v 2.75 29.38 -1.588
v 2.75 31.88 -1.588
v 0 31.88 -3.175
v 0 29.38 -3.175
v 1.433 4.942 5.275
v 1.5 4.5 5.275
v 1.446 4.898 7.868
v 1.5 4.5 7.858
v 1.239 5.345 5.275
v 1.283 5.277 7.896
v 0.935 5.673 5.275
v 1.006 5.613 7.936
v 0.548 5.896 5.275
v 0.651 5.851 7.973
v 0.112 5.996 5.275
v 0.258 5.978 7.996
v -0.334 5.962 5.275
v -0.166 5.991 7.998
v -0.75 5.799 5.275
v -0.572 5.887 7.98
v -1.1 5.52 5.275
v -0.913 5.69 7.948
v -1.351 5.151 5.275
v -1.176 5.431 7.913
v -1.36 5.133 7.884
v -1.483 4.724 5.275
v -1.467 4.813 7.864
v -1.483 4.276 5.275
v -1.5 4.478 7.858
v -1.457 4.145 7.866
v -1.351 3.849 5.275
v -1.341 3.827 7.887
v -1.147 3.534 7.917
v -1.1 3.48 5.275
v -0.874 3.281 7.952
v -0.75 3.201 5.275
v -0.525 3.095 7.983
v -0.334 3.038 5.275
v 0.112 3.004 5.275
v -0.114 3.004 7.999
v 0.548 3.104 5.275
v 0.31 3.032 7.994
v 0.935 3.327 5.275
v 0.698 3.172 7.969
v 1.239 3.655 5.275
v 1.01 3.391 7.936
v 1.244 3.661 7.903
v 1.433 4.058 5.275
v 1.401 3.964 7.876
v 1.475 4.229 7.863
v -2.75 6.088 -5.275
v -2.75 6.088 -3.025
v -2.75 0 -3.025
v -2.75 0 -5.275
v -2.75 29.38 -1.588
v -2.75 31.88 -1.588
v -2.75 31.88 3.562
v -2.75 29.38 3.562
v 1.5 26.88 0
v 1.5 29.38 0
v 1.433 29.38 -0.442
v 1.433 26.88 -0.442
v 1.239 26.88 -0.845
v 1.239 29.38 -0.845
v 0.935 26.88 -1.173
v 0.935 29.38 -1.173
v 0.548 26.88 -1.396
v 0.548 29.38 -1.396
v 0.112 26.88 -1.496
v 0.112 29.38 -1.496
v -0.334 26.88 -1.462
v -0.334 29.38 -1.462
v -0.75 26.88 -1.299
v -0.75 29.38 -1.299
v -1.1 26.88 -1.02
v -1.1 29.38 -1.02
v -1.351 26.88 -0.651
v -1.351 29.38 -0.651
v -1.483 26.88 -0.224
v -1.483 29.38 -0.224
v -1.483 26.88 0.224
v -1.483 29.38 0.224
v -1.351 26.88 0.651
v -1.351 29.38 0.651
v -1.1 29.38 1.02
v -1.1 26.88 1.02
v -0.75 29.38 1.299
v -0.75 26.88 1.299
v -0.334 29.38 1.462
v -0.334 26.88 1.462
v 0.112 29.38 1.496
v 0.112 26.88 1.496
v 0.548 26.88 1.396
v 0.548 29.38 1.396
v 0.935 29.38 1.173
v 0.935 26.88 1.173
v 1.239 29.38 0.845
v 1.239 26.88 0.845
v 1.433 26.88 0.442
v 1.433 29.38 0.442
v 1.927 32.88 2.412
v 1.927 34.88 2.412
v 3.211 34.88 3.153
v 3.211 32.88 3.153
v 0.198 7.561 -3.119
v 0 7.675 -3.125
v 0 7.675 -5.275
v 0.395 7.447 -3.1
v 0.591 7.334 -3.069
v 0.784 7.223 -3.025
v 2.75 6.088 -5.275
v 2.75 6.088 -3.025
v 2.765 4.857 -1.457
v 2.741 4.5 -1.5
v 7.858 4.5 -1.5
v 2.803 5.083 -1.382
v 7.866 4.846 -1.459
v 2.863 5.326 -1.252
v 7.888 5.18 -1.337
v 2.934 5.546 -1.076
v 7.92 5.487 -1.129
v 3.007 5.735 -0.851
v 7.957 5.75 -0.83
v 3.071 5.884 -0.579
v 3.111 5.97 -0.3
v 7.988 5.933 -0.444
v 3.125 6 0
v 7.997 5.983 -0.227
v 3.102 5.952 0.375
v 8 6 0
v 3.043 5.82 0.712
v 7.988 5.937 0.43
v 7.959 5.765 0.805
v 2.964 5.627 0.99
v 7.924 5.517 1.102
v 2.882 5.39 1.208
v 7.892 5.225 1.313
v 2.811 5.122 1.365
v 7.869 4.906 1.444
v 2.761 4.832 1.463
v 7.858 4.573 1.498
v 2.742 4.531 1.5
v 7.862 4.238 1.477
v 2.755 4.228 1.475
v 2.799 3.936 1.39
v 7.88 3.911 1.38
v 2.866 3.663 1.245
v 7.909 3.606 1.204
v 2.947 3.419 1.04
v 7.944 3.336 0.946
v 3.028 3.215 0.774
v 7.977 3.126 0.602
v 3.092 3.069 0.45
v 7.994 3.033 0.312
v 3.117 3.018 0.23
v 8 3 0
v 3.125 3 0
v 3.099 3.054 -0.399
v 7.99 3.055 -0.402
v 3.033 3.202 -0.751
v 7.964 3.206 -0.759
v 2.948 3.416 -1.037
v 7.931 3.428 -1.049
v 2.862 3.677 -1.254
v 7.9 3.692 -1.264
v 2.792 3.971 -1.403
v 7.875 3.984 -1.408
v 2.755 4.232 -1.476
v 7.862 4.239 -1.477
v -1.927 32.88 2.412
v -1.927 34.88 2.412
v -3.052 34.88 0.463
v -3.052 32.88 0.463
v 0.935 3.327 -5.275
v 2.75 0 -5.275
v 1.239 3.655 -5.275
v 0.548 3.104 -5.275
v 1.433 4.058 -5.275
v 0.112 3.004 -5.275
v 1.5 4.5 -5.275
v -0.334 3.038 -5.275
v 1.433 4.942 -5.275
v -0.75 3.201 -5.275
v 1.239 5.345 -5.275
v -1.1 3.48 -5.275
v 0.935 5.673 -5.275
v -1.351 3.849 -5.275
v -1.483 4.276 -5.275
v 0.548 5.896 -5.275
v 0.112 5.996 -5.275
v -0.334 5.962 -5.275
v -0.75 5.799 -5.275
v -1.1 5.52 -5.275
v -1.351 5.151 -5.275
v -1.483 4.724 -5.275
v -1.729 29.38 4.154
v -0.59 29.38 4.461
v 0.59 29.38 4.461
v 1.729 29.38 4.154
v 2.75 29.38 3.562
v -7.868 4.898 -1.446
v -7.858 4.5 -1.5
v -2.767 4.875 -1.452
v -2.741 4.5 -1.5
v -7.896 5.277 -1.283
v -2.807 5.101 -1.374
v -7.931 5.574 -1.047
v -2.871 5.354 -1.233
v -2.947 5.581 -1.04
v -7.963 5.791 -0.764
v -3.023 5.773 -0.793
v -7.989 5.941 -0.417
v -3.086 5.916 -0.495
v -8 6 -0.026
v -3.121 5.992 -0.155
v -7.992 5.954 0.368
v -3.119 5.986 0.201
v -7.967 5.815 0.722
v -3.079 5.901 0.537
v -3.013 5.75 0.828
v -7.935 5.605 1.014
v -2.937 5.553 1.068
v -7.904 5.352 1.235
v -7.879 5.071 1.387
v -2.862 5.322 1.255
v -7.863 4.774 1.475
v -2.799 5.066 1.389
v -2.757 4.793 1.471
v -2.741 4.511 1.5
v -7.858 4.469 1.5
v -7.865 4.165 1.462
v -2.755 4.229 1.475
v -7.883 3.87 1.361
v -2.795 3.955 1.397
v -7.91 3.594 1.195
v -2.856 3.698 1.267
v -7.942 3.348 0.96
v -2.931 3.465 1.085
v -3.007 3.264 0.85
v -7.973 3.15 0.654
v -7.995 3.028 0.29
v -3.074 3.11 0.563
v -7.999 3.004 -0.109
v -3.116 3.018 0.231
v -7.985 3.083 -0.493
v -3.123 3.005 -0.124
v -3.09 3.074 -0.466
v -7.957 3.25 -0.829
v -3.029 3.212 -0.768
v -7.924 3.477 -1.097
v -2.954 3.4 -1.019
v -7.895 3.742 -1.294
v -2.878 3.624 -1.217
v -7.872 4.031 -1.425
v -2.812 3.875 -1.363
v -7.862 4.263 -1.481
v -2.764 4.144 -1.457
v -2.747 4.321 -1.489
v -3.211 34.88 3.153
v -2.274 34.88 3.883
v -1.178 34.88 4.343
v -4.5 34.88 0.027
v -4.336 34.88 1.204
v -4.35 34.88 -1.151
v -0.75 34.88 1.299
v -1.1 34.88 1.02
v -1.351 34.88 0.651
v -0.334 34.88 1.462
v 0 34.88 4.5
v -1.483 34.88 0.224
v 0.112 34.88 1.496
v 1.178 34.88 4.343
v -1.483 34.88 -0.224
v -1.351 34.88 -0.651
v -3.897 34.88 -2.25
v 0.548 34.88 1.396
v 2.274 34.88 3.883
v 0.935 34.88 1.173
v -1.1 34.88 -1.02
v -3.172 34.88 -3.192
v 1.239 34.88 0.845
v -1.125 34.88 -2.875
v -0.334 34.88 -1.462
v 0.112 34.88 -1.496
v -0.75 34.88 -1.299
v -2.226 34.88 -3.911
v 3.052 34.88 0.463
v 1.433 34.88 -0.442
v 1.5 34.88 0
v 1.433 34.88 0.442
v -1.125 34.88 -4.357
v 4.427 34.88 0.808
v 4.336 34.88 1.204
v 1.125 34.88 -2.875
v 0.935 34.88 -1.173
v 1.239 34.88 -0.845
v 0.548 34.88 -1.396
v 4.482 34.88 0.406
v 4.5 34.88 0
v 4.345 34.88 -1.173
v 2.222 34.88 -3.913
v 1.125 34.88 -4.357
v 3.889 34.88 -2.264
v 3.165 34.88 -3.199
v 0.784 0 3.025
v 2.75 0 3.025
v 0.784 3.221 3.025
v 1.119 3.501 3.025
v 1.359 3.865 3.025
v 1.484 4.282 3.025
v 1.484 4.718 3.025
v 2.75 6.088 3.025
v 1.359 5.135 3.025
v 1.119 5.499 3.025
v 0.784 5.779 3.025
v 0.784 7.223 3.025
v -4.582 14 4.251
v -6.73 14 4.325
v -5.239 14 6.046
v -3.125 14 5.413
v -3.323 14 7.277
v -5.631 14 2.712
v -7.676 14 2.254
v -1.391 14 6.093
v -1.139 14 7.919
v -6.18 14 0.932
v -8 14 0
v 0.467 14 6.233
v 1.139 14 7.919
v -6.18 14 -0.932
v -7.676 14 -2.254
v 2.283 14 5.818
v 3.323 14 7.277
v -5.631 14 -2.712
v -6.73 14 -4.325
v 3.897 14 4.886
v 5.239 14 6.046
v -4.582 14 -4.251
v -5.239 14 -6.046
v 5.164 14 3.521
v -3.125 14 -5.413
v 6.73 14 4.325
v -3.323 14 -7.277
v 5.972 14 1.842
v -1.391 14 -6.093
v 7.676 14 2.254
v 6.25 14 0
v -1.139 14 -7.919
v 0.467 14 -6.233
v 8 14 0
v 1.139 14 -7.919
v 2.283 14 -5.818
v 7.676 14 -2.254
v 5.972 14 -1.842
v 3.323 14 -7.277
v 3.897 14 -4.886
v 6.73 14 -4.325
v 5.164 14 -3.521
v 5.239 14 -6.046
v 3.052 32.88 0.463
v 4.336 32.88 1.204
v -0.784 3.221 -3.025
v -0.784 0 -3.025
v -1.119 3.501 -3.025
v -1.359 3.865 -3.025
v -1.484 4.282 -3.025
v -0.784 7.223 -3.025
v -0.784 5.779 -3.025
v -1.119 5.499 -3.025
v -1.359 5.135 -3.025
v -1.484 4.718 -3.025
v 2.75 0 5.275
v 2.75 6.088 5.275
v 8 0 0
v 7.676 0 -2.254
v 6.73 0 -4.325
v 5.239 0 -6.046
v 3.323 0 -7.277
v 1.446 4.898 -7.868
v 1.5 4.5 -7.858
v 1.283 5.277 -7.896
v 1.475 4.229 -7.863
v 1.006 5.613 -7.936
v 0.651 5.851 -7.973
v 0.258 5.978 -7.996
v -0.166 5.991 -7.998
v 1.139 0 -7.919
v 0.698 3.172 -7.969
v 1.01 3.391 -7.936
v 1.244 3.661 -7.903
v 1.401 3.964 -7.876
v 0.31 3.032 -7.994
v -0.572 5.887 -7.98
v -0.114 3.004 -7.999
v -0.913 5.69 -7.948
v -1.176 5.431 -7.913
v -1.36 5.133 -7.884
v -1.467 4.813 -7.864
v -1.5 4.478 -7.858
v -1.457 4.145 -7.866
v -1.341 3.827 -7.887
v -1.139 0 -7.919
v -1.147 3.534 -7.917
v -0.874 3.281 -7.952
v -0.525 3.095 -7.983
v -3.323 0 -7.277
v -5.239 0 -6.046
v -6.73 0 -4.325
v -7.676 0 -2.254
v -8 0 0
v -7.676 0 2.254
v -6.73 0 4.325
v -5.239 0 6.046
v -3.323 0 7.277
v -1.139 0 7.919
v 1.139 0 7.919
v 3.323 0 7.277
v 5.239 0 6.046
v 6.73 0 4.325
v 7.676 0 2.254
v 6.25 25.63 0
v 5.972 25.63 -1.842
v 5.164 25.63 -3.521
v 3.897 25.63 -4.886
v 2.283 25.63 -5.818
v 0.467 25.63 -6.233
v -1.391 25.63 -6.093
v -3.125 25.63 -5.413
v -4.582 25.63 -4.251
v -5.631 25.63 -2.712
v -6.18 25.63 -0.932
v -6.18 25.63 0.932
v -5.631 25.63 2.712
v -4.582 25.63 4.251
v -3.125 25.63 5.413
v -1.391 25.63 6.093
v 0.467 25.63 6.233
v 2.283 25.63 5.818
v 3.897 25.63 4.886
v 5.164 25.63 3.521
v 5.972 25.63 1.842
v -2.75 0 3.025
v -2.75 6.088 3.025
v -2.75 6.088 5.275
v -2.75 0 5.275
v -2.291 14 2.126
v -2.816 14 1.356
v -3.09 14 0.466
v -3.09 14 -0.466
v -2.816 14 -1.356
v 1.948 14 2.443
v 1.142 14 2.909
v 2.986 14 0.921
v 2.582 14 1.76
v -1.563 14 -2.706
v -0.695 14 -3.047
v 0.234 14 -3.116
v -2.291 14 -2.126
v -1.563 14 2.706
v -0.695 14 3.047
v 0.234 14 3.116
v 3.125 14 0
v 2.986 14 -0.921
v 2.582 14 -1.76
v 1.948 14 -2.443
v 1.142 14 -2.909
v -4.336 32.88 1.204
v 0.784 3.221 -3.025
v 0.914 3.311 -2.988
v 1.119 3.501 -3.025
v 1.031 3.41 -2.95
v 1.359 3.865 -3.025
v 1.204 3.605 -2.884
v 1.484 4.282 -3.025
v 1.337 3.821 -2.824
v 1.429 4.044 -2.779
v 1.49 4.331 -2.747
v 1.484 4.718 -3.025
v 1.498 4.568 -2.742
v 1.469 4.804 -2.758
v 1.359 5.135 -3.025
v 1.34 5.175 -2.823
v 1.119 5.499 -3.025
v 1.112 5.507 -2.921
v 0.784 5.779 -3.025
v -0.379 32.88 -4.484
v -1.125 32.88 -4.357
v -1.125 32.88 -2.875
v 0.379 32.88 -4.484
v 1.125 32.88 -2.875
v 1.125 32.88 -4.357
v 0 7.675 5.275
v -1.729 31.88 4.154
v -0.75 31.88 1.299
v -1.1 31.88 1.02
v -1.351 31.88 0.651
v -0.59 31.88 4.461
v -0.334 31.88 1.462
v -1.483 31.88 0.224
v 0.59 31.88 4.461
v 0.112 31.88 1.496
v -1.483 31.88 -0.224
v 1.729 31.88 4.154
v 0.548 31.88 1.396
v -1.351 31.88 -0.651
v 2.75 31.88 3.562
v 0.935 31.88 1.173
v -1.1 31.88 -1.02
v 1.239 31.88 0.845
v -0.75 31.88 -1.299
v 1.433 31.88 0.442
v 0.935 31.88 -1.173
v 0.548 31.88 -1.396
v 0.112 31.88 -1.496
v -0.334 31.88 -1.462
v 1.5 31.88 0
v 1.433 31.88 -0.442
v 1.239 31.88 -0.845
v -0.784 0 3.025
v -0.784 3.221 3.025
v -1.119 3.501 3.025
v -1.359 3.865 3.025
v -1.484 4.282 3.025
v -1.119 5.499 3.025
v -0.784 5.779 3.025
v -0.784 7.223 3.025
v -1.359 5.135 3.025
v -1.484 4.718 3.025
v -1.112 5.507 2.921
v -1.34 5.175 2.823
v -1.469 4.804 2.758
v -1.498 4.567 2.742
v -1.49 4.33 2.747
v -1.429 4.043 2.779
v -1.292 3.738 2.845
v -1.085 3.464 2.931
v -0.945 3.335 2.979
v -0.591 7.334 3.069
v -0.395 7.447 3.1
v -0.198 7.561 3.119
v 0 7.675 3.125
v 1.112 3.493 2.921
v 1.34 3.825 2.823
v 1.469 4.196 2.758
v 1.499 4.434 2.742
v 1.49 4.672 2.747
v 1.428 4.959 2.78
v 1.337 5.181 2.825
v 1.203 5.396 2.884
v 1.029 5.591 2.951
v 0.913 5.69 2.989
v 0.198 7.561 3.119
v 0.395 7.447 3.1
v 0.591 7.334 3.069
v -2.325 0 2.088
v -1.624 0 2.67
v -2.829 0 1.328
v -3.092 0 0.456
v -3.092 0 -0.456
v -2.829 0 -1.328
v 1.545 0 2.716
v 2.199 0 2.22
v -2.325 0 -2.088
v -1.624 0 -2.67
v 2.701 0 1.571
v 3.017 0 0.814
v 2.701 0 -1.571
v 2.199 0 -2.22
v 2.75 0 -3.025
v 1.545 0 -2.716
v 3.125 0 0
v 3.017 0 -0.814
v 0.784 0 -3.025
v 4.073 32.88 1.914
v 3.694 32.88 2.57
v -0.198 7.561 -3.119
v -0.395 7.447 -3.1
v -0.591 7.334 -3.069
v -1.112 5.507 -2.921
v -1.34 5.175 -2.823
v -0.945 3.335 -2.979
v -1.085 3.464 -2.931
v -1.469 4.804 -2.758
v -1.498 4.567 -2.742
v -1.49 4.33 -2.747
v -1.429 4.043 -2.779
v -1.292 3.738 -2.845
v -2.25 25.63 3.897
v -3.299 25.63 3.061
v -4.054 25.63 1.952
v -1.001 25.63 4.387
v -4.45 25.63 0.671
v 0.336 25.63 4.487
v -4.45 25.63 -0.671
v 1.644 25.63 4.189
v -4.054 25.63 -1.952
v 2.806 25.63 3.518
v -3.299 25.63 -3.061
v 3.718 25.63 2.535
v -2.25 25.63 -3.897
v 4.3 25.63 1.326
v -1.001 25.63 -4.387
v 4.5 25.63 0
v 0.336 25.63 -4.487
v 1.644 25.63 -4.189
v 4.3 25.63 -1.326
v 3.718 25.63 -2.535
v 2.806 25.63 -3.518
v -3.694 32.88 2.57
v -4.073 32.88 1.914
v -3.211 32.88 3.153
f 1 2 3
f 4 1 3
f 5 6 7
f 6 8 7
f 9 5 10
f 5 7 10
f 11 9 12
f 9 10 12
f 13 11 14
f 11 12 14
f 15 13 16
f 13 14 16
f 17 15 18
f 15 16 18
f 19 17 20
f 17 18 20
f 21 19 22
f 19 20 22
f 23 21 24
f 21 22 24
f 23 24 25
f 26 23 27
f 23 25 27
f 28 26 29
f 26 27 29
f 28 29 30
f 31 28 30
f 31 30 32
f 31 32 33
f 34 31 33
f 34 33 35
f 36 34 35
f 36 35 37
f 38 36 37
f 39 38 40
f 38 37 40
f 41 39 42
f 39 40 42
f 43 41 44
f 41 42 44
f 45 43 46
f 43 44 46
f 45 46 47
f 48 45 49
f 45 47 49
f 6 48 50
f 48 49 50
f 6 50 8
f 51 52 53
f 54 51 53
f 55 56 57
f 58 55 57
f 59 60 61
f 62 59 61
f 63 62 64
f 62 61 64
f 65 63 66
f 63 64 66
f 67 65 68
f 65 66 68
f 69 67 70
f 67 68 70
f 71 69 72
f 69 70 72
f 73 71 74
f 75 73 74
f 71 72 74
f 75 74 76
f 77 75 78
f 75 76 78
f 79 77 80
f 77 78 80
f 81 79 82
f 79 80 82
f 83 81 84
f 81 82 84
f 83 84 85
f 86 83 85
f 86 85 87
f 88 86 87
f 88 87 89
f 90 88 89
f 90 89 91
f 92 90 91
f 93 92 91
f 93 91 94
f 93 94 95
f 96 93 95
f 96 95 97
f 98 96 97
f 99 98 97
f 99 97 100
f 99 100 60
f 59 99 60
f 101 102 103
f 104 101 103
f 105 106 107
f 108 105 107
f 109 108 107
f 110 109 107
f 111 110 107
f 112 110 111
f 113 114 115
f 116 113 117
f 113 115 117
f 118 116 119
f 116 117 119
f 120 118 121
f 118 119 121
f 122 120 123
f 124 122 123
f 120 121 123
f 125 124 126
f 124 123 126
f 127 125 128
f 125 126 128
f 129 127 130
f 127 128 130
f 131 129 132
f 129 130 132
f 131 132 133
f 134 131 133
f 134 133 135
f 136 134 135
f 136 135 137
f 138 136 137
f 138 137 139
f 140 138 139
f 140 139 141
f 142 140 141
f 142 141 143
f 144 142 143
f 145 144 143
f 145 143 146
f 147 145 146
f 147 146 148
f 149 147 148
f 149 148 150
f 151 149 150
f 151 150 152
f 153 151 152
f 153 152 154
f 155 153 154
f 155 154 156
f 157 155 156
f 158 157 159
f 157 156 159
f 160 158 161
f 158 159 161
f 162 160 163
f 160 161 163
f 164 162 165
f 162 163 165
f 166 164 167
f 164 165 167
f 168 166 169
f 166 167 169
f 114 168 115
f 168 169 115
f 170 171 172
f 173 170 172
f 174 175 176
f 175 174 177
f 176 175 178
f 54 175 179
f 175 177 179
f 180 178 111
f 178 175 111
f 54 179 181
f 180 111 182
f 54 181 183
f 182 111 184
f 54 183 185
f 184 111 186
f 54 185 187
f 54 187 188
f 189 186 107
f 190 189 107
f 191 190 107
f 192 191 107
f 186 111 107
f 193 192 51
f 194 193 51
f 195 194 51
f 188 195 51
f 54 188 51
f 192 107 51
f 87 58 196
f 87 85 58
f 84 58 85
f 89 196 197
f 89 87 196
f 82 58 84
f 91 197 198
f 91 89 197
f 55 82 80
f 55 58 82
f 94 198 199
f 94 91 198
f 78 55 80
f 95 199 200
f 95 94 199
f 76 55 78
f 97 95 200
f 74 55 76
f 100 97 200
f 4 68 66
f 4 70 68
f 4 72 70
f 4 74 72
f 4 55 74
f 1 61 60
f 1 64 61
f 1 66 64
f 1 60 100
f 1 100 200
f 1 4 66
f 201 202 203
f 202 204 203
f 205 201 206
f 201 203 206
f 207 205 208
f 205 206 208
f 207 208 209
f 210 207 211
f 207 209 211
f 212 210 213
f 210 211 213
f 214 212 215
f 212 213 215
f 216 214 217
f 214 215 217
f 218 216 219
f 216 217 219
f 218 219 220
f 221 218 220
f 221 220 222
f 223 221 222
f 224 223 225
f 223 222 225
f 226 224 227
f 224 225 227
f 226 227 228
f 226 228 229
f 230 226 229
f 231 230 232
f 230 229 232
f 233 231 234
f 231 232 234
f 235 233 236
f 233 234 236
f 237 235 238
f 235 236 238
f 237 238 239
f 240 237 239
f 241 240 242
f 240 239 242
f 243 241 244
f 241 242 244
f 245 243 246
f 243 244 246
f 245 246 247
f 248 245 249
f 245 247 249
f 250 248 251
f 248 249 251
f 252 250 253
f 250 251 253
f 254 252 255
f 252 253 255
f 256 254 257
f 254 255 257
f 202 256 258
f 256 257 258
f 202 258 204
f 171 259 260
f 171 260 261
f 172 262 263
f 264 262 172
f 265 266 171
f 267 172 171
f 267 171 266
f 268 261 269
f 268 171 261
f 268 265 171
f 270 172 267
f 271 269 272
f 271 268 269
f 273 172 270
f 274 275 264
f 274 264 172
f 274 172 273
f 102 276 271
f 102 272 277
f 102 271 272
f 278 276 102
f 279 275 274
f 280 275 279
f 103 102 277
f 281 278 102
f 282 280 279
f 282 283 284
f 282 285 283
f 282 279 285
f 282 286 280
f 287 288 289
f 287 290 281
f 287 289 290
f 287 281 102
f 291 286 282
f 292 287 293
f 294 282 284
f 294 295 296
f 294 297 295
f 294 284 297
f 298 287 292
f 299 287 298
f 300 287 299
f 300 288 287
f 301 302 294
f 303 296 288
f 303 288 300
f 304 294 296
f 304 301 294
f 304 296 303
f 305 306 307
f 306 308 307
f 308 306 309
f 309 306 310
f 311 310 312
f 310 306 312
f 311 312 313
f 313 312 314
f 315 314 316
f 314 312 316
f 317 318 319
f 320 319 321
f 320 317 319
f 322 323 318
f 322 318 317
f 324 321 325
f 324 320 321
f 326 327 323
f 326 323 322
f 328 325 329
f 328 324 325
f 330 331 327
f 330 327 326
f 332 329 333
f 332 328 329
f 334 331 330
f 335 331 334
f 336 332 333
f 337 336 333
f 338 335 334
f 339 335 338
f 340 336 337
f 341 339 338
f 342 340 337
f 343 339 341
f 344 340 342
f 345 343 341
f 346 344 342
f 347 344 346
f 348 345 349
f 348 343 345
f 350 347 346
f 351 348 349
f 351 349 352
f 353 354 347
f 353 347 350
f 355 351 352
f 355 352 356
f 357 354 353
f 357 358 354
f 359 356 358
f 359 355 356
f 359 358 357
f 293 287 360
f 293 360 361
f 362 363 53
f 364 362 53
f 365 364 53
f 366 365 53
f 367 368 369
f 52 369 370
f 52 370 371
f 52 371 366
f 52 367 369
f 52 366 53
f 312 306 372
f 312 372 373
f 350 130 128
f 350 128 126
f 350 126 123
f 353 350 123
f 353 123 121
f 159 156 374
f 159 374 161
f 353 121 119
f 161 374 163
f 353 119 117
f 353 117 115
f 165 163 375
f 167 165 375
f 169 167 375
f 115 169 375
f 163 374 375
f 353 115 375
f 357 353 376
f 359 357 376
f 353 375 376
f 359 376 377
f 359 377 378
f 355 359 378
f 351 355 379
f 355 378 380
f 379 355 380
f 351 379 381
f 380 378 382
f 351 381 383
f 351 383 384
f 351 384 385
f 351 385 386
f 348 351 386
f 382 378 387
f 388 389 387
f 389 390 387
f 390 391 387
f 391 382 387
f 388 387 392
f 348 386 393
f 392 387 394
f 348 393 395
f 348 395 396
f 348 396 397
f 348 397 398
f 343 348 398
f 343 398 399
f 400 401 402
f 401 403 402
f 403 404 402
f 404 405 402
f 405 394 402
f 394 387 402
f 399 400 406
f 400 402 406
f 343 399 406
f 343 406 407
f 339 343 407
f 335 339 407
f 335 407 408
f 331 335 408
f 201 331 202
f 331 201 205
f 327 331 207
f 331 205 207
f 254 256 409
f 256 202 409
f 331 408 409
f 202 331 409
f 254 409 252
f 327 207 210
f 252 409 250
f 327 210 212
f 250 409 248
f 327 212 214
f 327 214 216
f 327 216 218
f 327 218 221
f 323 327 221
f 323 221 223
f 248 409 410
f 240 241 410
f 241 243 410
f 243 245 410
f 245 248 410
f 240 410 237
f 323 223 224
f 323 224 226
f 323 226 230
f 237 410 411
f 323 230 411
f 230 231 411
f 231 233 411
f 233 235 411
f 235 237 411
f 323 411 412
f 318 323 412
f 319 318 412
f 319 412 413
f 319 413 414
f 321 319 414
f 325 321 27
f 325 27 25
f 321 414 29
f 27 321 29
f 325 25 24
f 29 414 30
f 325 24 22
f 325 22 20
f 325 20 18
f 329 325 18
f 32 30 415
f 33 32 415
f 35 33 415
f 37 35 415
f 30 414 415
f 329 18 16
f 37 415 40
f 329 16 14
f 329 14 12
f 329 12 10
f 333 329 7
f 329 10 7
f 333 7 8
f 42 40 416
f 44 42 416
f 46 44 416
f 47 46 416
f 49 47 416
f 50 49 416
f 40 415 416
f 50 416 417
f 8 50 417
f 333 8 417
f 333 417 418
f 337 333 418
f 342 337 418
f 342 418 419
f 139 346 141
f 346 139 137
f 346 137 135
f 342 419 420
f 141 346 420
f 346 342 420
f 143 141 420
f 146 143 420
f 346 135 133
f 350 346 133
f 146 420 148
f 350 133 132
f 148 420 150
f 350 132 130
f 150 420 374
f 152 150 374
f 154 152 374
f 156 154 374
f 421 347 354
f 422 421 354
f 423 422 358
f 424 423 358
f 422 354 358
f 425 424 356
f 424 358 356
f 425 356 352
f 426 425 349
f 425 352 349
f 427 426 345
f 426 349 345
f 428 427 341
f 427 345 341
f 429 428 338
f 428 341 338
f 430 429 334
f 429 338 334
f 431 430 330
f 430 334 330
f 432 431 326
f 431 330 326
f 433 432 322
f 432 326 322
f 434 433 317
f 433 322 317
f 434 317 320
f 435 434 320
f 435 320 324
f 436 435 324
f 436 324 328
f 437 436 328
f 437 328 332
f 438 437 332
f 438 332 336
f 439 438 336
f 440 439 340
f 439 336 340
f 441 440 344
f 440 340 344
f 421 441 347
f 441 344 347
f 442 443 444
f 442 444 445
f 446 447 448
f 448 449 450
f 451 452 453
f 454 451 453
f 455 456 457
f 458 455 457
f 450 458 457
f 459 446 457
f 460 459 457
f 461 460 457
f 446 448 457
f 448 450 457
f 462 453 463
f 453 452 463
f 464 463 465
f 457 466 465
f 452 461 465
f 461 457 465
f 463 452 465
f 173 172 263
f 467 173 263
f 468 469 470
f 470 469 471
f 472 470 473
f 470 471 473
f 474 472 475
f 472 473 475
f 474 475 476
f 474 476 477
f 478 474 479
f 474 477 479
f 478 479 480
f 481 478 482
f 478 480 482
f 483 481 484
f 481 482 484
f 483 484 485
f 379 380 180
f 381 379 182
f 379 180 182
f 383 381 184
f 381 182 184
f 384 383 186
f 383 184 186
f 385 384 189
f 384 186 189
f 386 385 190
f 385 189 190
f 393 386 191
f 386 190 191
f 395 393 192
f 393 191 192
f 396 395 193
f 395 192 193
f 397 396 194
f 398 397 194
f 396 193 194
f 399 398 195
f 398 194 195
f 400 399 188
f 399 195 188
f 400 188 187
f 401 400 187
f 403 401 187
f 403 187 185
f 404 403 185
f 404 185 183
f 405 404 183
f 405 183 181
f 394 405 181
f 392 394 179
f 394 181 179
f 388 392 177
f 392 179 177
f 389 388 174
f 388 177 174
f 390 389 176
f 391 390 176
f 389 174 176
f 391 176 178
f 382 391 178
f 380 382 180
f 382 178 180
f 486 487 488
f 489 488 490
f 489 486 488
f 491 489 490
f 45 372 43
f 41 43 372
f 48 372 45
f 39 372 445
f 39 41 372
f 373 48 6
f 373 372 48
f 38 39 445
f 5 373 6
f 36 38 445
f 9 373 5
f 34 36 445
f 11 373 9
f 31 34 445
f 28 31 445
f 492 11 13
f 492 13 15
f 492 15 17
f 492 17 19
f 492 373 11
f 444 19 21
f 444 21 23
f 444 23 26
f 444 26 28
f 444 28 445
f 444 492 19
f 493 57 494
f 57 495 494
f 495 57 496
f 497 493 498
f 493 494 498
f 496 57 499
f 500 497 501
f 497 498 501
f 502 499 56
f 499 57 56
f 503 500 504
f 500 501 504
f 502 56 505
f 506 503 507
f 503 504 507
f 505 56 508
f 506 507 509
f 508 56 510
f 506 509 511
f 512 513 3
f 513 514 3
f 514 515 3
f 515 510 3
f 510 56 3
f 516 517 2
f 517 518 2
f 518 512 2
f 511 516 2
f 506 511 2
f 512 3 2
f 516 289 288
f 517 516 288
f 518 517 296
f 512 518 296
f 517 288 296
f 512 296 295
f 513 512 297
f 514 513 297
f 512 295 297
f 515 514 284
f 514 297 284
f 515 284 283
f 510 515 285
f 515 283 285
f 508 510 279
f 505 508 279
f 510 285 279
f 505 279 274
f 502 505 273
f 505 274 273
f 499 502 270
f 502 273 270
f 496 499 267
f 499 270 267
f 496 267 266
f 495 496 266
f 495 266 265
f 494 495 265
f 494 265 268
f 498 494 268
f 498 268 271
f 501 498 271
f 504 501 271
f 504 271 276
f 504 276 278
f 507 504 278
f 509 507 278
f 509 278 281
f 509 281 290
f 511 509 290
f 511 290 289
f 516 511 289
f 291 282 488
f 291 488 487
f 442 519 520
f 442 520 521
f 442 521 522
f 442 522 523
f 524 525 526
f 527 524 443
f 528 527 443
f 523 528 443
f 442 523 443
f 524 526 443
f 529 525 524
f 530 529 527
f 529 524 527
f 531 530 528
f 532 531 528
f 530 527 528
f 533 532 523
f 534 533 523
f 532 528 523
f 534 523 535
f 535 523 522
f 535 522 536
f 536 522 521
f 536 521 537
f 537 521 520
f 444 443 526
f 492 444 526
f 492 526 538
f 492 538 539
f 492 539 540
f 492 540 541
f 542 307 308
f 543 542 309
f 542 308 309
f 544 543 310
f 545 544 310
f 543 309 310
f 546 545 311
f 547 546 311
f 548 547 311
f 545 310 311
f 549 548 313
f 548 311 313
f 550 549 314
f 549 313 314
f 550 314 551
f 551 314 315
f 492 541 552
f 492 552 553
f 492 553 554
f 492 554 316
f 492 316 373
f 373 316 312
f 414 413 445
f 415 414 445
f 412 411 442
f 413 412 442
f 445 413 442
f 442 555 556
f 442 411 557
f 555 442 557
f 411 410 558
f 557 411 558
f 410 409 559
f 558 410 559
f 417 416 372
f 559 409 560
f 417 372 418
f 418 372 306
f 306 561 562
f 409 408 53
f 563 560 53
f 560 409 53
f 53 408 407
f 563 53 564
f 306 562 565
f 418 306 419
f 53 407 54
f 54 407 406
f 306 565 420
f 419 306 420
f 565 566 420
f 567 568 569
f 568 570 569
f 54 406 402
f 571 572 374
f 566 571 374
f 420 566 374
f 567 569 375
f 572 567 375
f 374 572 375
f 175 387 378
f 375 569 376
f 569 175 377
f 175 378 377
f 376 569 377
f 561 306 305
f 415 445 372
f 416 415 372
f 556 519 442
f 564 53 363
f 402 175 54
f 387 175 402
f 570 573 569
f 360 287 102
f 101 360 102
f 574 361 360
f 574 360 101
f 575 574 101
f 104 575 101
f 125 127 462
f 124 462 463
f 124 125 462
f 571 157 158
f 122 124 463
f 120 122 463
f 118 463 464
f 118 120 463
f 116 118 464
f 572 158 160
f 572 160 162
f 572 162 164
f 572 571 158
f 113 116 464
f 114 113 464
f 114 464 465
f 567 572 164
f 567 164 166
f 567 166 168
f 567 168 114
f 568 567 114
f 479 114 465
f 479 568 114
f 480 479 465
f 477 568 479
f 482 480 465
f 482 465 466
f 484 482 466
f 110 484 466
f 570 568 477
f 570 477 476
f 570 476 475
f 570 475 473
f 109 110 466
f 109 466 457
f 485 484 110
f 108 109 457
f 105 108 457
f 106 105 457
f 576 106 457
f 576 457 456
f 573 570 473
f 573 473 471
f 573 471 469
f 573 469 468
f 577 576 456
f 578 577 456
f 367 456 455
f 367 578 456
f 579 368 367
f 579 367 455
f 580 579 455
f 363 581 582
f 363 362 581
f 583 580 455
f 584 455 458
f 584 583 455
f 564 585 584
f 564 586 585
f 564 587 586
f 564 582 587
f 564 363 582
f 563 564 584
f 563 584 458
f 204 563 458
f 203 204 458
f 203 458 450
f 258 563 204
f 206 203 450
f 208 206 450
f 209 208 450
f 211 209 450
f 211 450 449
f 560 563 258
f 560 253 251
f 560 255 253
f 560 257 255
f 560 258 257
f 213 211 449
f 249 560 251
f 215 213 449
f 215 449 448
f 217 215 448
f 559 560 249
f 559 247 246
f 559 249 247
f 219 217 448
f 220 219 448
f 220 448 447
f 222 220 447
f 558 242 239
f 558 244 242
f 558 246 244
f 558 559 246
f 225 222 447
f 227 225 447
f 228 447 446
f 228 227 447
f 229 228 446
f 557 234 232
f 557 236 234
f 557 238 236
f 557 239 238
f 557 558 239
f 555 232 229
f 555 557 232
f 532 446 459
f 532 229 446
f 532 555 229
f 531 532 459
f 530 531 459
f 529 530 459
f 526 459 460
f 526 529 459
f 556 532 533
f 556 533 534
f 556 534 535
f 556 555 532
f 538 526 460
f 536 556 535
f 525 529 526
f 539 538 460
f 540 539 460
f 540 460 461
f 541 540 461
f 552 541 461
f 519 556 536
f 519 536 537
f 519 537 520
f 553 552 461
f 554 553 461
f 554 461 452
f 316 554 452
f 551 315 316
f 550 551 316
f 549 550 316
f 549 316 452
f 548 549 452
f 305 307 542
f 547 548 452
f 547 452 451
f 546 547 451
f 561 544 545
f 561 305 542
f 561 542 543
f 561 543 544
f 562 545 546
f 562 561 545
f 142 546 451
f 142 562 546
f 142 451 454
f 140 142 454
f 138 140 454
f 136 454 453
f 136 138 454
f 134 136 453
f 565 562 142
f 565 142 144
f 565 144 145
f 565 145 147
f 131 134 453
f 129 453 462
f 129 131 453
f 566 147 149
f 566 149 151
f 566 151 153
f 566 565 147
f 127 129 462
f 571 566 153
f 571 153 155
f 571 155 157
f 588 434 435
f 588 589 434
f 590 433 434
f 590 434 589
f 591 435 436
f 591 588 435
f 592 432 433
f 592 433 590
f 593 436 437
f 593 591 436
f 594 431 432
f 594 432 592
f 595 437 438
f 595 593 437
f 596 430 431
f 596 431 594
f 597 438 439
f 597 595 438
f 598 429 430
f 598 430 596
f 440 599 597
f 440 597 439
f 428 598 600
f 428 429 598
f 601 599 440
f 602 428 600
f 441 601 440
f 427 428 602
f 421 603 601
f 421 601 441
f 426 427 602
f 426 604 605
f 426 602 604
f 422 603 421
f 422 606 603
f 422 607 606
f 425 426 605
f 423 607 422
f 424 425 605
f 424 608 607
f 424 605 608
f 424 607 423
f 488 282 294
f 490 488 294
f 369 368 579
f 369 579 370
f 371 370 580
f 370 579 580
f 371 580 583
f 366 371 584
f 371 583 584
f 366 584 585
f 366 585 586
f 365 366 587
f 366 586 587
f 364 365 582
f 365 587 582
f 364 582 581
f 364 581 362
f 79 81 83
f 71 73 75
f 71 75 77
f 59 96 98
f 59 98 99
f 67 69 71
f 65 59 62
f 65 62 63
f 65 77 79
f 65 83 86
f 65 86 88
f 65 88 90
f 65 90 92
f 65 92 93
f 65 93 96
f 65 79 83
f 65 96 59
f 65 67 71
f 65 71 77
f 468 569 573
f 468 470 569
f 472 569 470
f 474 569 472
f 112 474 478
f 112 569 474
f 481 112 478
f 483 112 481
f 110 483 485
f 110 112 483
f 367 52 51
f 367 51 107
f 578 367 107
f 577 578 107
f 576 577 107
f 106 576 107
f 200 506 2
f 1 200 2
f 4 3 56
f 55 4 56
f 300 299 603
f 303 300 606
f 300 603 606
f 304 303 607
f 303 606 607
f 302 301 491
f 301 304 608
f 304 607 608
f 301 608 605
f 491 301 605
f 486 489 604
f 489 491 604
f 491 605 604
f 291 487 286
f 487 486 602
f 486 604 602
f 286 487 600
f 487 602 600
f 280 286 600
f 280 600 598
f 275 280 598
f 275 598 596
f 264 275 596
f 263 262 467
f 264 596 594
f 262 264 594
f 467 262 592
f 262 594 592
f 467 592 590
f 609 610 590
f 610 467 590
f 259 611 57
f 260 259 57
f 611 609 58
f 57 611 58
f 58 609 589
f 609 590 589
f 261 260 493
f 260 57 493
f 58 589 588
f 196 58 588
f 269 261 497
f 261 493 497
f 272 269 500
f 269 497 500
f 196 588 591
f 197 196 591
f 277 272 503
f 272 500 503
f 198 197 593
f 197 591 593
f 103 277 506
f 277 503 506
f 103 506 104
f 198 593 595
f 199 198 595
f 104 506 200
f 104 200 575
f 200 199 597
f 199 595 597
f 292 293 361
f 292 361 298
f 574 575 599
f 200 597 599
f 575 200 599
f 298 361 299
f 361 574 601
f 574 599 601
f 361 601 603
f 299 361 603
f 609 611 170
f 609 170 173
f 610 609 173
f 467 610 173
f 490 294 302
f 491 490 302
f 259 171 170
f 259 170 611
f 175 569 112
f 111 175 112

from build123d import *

# Parameters (mm, degrees)
SKETCH1_R           = 8
SKETCH1_R_2         = 3.125
BOSS_EXTRUDE1_DEPTH = 14
SKETCH2_R           = 1.5
CUT_EXTRUDE1_DEPTH  = 9
CUT_EXTRUDE2_START  = -3.025
CUT_EXTRUDE2_DEPTH  = 2.25
CUT_EXTRUDE3_START  = 3.025
CUT_EXTRUDE3_DEPTH  = 2.25
SKETCH5_R           = 6.25
BOSS_EXTRUDE2_DEPTH = 11.63
SKETCH6_R           = 4.5
BOSS_EXTRUDE3_DEPTH = 9.25
SKETCH7_R           = 1.5
CUT_EXTRUDE4_DEPTH  = 8
CUT_EXTRUDE5_START  = -3
SKETCH8_R           = 1.5
CUT_EXTRUDE5_DEPTH  = 2.5
SKETCH9_W           = 2.25
SKETCH9_H           = 3.25
CUT_EXTRUDE6_DEPTH  = 2
CIRPATTERN1_COUNT   = 3
CIRPATTERN3_COUNT   = 2
CIRPATTERN3_ANGLE   = 90


with BuildPart() as part:
    # Sketch1 → Boss-Extrude1 (new body)
    with BuildSketch(Plane(origin=(0, 0, 0), x_dir=(1, 0, 0), z_dir=(0, 1, 0))):
        Circle(SKETCH1_R)
        Circle(SKETCH1_R_2, mode=Mode.SUBTRACT)
    extrude(amount=BOSS_EXTRUDE1_DEPTH)

    # Sketch2 → Cut-Extrude1 (cut, symmetric)
    with BuildSketch(Plane.XY):
        with Locations((0, 4.5)):
            Circle(SKETCH2_R)
    cut_extrude1 = extrude(amount=CUT_EXTRUDE1_DEPTH, both=True, mode=Mode.SUBTRACT)

    # Sketch3 → Cut-Extrude2 (cut)
    with BuildSketch(Plane.XY.offset(CUT_EXTRUDE2_START)):
        Polygon((-2.75, 2.91228676), (0, 1.324573519), (2.75, 2.91228676), (2.75, 0), (-2.75, 0), align=None)
        Polygon((2.75, 2.91228676), (-2.75, 2.91228676), (-2.75, 6.08771324), (0, 7.675426481), (2.75, 6.08771324), align=None)
        Polygon((0, 1.324573519), (2.75, 2.91228676), (-2.75, 2.91228676), align=None)
    extrude(amount=-CUT_EXTRUDE2_DEPTH, mode=Mode.SUBTRACT)

    # Sketch4 → Cut-Extrude3 (cut)
    with BuildSketch(Plane.XY.offset(CUT_EXTRUDE3_START)):
        Polygon((-2.75, 2.91228676), (0, 1.324573519), (2.75, 2.91228676), (2.75, 0), (-2.75, 0), align=None)
        Polygon((0, 1.324573519), (2.75, 2.91228676), (-2.75, 2.91228676), align=None)
        Polygon((2.75, 2.91228676), (-2.75, 2.91228676), (-2.75, 6.08771324), (0, 7.675426481), (2.75, 6.08771324), align=None)
    extrude(amount=CUT_EXTRUDE3_DEPTH, mode=Mode.SUBTRACT)

    # Sketch5 → Boss-Extrude2 (add)
    with BuildSketch(Plane(origin=(0, 14, 0), x_dir=(1, 0, 0), z_dir=(0, 1, 0))):
        Circle(SKETCH5_R)
    extrude(amount=BOSS_EXTRUDE2_DEPTH)

    # Sketch6 → Boss-Extrude3 (add)
    with BuildSketch(Plane(origin=(0, 25.63, 0), x_dir=(1, 0, 0), z_dir=(0, 1, 0))):
        Circle(SKETCH6_R)
    extrude(amount=BOSS_EXTRUDE3_DEPTH)

    # Sketch7 → Cut-Extrude4 (cut)
    with BuildSketch(Plane(origin=(0, 34.88, 0), x_dir=(1, 0, 0), z_dir=(0, 1, 0))):
        Circle(SKETCH7_R)
    extrude(amount=-CUT_EXTRUDE4_DEPTH, mode=Mode.SUBTRACT)

    # Sketch8 → Cut-Extrude5 (cut)
    with BuildSketch(Plane(origin=(0, 34.88, 0), x_dir=(1, 0, 0), z_dir=(0, 1, 0)).offset(CUT_EXTRUDE5_START)):
        with BuildLine():
            Line((2.75, -1.58771324), (0, -3.175426481))
            Line((0, -3.175426481), (-2.75, -1.58771324))
            Line((-2.75, -1.58771324), (-2.75, -3.561951712))
            ThreePointArc((-2.75, -3.561951712), (0, -4.5), (2.75, -3.561951712))
            Line((2.75, -3.561951712), (2.75, -1.58771324))
        make_face()
        Polygon((-2.75, -1.58771324), (2.75, -1.58771324), (0, -3.175426481), align=None)
        Polygon((-2.75, 1.58771324), (-2.75, -1.58771324), (2.75, -1.58771324), (2.75, 1.58771324), (0, 3.175426481), align=None)
        Circle(SKETCH8_R, mode=Mode.SUBTRACT)
    extrude(amount=-CUT_EXTRUDE5_DEPTH, mode=Mode.SUBTRACT)

    # Sketch9 → Cut-Extrude6 (cut)
    with BuildSketch(Plane(origin=(0, 34.88, 0), x_dir=(1, 0, 0), z_dir=(0, 1, 0))):
        with Locations((0, 4.5)):
            Rectangle(SKETCH9_W, SKETCH9_H)
    cut_extrude6 = extrude(amount=-CUT_EXTRUDE6_DEPTH, mode=Mode.SUBTRACT)

    # CirPattern1: Cut-Extrude6 ×3 about axis
    cirpattern1_axis = Axis((0, 0, 0), (0, 1, 0))
    for i in range(1, CIRPATTERN1_COUNT):
        add(cut_extrude6.rotate(cirpattern1_axis, i * 360 / CIRPATTERN1_COUNT), mode=Mode.SUBTRACT)

    # CirPattern3: Cut-Extrude1 ×2 about axis
    cirpattern3_axis = Axis((0, 0, 0), (0, 1, 0))
    for i in range(1, CIRPATTERN3_COUNT):
        add(cut_extrude1.rotate(cirpattern3_axis, i * CIRPATTERN3_ANGLE / (CIRPATTERN3_COUNT - 1)), mode=Mode.SUBTRACT)


solid = part.part
